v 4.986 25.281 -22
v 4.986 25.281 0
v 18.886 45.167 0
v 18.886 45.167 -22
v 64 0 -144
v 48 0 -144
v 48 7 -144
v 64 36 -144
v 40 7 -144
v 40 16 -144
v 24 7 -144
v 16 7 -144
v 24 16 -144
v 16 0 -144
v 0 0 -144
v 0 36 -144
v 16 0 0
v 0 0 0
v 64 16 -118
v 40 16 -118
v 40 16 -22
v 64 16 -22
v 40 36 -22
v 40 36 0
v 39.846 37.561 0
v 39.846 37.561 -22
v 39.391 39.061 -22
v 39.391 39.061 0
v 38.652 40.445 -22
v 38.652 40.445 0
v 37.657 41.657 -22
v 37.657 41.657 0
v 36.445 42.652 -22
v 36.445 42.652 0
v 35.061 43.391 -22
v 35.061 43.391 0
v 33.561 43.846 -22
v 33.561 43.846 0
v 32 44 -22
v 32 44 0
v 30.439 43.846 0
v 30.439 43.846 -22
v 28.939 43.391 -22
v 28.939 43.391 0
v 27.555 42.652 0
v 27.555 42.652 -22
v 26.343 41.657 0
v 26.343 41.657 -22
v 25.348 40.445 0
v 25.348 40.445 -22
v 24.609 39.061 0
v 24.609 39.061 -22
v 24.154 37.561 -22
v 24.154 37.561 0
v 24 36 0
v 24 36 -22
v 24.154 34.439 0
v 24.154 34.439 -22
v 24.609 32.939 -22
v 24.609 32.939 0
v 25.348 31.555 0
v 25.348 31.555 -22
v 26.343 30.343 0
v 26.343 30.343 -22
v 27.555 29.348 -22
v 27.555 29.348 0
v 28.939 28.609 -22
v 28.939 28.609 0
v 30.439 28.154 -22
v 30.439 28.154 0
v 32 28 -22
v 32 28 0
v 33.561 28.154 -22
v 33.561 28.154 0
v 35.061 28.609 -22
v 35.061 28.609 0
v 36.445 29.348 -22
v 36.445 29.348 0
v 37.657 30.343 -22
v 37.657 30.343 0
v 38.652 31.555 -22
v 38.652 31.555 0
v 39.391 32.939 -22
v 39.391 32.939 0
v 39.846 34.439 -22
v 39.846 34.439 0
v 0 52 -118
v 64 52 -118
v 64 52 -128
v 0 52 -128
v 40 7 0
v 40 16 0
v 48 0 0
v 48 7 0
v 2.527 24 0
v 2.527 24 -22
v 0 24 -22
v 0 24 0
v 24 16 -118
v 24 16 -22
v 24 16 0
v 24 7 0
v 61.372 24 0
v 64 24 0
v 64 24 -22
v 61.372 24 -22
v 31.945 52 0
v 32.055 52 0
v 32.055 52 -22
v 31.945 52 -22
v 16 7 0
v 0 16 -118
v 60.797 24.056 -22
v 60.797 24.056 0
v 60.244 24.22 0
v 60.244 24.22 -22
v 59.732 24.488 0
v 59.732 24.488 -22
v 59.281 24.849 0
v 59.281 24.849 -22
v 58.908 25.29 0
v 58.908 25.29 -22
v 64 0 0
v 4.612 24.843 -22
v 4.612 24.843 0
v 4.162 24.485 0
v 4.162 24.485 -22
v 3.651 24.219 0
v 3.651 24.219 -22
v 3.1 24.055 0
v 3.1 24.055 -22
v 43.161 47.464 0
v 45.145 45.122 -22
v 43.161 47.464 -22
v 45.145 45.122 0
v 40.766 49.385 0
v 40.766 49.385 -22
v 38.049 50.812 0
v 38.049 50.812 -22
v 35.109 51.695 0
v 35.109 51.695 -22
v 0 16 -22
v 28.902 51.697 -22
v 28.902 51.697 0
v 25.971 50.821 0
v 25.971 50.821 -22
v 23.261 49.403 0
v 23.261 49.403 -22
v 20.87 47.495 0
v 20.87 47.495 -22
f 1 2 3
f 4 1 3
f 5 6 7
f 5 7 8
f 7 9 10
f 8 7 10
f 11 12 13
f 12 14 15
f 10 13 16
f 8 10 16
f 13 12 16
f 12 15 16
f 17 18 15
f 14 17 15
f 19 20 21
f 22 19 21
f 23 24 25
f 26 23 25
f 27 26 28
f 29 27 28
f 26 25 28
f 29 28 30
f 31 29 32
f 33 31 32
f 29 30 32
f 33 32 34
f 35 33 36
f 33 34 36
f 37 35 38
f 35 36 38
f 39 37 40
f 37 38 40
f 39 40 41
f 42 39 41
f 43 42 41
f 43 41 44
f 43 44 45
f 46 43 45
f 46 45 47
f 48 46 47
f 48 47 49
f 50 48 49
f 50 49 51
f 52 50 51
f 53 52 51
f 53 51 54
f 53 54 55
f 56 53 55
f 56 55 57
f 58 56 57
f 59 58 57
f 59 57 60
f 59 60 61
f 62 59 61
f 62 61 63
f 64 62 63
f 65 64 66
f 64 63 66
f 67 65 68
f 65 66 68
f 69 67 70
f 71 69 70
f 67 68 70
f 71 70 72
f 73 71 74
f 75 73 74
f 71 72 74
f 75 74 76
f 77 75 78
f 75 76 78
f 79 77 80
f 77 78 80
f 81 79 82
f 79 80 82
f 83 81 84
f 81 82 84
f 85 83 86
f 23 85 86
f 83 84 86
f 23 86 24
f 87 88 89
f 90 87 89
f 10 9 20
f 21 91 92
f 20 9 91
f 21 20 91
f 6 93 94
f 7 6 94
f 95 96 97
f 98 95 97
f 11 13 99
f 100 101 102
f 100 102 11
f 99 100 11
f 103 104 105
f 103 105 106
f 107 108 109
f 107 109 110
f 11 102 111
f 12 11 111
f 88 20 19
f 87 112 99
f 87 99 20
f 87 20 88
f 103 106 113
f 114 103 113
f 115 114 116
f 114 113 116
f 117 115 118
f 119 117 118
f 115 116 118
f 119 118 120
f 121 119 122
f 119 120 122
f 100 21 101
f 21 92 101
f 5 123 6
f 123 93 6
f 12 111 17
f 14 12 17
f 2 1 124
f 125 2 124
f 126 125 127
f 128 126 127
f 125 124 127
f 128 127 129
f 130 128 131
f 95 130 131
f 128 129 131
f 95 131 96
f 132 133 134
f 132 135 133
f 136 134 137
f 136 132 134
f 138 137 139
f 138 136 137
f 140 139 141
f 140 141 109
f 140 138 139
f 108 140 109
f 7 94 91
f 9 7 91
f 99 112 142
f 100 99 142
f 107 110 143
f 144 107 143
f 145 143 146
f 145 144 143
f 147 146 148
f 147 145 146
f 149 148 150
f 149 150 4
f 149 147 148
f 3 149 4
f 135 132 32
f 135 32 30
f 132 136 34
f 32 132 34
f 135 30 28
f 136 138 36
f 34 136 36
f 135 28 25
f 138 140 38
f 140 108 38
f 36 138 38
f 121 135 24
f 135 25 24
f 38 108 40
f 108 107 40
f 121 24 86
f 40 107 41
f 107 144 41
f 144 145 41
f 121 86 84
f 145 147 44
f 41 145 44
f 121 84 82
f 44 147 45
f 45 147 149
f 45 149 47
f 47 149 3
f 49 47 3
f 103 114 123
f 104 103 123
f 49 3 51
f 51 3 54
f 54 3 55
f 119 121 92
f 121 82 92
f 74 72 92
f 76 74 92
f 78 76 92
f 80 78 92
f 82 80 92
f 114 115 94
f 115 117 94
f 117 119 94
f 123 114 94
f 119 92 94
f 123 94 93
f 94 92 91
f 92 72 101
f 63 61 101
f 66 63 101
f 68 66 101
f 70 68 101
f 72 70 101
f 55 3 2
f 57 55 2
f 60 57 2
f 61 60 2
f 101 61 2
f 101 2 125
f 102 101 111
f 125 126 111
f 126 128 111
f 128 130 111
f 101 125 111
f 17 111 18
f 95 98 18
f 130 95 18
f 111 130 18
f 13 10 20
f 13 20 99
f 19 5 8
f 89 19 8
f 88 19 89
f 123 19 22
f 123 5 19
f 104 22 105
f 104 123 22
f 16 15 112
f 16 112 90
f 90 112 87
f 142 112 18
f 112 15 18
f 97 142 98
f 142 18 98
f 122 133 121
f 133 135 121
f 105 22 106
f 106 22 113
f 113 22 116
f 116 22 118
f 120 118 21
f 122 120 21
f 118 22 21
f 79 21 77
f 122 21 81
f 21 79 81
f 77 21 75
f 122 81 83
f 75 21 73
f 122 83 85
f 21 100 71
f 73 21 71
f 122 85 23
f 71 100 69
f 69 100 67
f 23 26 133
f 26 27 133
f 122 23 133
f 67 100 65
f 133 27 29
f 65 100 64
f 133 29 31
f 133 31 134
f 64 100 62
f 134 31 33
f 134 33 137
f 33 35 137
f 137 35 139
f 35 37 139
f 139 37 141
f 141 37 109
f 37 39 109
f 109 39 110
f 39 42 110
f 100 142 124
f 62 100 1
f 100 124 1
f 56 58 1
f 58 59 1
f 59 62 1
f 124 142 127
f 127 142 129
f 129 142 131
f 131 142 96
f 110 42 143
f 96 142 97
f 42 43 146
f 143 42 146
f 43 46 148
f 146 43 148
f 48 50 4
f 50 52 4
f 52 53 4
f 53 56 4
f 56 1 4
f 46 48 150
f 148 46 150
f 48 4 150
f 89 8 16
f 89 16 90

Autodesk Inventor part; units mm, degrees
ref_plane "YZ Plane" through (0, 0, 0) normal (1, 0, 0) x (0, 1, 0)
ref_plane "XZ Plane" through (0, 0, 0) normal (0, 1, 0) x (-1, 0, 0)
ref_plane "XY Plane" through (0, 0, 0) normal (0, 0, 1) x (1, 0, 0)
sketch "Boceto1" plane through (0, 0, 0) normal (0, 0, 1) x (1, 0, 0)
  line L0 (64, 24) -> (64, 0)
  line L1 (0, 0) -> (0, 24)
  line L2 (0, 0) -> (0, 24) construction
  line L3 (40, 7) -> (40, 16)
  line L4 (64, 0) -> (64, 24)
  line L5 (0, 24) -> (0, 0)
  line L6 (64, 0) -> (64, 16)
  line L7 (40, 16) -> (24, 16)
  line L8 (0, 16) -> (0, 0)
  line L9 (24, 16) -> (40, 16)
  line L10 (64, 16) -> (64, 7)
  line L11 (0, 7) -> (0, 16)
  line L12 (48, 0) -> (48, 7)
  line L13 (16, 7) -> (16, 0)
  line L14 (24, 16) -> (24, 7)
  line L15 (48, 7) -> (40, 7)
  line L16 (24, 7) -> (16, 7)
  arc A0 (45.1449, 45.122) -> (18.8863, 45.1669) centre (32, 36) ccw
  circle A1 centre (32, 36) radius 8
  line L17 (64, 24) -> (59.8026, 24)
  line L18 (4.09, 24) -> (0, 24)
  line L19 (64, 0) -> (48, 0)
  line L20 (16, 0) -> (0, 0)
  line L21 (0, 0) -> (16, 0)
  line L22 (48, 0) -> (60.5696, 0)
  line L23 (0, 0) -> (16, 0)
  line L24 (48, 0) -> (64, 0)
  line L25 (0, 0) -> (16, 0)
  line L26 (48, 0) -> (64, 0)
  line L27 (4.09, 24) -> (18.8863, 45.1669)
  line L28 (45.1449, 45.122) -> (59.8026, 24)
  line L29 (16, 0) -> (48, 0)
  line L30 (0, 0) -> (64, 0)
  line L31 (64, 0) -> (64, 24)
  line L32 (32.0546, 51.9999) -> (31.9454, 51.9999)
  line L33 (0, 24) -> (0, 0)
  line L34 (0, 0) -> (64, 0)
  line L35 (64, 0) -> (64, 53.4326)
  line L36 (64, 53.4326) -> (0, 53.4326)
  line L37 (0, 53.4326) -> (0, 0)
  circle A2 centre (32, 36) radius 8
  point P0 (30.2848, 0)
  dimension "d6" = 24
  dimension "d9" = 32
  dimension "d10" = 16
  dimension "d11" = 9
sketch "Boceto2" plane through (0, 0, 0) normal (1, 0, 0) x (0, 1, 0)
  point P0 (0, 0)
sketch "Boceto3" plane through (0, 0, 0) normal (1, 0, 0) x (0, 1, 0)
  point P0 (0, 0)
sketch "Boceto4" plane through (0, 0, 0) normal (1, 0, 0) x (0, 1, 0)
  line L0 (0, 0) -> (0, -144)
  line L1 (0, -144) -> (36, -144)
  line L2 (0, -144) -> (16, -144)
  line L3 (16, -118) -> (16, -22)
  line L4 (16, 0) -> (0, 0)
  line L5 (0, 0) -> (0, -144)
  line L6 (36, -144) -> (16, -144)
  line L7 (16, -118) -> (52, -118)
  line L8 (52, -118) -> (52, -128)
  line L9 (36, -144) -> (52, -128)
  line L10 (52, 0) -> (16, 0)
  line L11 (16, -22) -> (52, -22)
  line L12 (52, -22) -> (52, 0)
  line L13 (52, -128) -> (52, -118)
  line L14 (52, -22) -> (52, 0)
  dimension "d15" = 144
  dimension "d17" = 16
  dimension "d22" = 22
extrude "Extrusión1" add sketch "Boceto4" along normal blind 64
extrude "Extrusión3" cut sketch "Boceto1" against normal blind 100 contours L17 L28 A0 L27 L18 L37 L36 L35
extrude "Extrusión4" cut sketch "Boceto1" against normal blind 100 contours A1
extrude "Extrusión5" cut sketch "Boceto1" against normal blind 144 contours L29 L13 L16 L14 L7 L3 L15 L12
fillet "Empalme1" radius 3 2 edges at (59.8026, 24, -11) (4.09, 24, -11)
properties part number "Pieza2 Base" material "Hierro, fundido"
